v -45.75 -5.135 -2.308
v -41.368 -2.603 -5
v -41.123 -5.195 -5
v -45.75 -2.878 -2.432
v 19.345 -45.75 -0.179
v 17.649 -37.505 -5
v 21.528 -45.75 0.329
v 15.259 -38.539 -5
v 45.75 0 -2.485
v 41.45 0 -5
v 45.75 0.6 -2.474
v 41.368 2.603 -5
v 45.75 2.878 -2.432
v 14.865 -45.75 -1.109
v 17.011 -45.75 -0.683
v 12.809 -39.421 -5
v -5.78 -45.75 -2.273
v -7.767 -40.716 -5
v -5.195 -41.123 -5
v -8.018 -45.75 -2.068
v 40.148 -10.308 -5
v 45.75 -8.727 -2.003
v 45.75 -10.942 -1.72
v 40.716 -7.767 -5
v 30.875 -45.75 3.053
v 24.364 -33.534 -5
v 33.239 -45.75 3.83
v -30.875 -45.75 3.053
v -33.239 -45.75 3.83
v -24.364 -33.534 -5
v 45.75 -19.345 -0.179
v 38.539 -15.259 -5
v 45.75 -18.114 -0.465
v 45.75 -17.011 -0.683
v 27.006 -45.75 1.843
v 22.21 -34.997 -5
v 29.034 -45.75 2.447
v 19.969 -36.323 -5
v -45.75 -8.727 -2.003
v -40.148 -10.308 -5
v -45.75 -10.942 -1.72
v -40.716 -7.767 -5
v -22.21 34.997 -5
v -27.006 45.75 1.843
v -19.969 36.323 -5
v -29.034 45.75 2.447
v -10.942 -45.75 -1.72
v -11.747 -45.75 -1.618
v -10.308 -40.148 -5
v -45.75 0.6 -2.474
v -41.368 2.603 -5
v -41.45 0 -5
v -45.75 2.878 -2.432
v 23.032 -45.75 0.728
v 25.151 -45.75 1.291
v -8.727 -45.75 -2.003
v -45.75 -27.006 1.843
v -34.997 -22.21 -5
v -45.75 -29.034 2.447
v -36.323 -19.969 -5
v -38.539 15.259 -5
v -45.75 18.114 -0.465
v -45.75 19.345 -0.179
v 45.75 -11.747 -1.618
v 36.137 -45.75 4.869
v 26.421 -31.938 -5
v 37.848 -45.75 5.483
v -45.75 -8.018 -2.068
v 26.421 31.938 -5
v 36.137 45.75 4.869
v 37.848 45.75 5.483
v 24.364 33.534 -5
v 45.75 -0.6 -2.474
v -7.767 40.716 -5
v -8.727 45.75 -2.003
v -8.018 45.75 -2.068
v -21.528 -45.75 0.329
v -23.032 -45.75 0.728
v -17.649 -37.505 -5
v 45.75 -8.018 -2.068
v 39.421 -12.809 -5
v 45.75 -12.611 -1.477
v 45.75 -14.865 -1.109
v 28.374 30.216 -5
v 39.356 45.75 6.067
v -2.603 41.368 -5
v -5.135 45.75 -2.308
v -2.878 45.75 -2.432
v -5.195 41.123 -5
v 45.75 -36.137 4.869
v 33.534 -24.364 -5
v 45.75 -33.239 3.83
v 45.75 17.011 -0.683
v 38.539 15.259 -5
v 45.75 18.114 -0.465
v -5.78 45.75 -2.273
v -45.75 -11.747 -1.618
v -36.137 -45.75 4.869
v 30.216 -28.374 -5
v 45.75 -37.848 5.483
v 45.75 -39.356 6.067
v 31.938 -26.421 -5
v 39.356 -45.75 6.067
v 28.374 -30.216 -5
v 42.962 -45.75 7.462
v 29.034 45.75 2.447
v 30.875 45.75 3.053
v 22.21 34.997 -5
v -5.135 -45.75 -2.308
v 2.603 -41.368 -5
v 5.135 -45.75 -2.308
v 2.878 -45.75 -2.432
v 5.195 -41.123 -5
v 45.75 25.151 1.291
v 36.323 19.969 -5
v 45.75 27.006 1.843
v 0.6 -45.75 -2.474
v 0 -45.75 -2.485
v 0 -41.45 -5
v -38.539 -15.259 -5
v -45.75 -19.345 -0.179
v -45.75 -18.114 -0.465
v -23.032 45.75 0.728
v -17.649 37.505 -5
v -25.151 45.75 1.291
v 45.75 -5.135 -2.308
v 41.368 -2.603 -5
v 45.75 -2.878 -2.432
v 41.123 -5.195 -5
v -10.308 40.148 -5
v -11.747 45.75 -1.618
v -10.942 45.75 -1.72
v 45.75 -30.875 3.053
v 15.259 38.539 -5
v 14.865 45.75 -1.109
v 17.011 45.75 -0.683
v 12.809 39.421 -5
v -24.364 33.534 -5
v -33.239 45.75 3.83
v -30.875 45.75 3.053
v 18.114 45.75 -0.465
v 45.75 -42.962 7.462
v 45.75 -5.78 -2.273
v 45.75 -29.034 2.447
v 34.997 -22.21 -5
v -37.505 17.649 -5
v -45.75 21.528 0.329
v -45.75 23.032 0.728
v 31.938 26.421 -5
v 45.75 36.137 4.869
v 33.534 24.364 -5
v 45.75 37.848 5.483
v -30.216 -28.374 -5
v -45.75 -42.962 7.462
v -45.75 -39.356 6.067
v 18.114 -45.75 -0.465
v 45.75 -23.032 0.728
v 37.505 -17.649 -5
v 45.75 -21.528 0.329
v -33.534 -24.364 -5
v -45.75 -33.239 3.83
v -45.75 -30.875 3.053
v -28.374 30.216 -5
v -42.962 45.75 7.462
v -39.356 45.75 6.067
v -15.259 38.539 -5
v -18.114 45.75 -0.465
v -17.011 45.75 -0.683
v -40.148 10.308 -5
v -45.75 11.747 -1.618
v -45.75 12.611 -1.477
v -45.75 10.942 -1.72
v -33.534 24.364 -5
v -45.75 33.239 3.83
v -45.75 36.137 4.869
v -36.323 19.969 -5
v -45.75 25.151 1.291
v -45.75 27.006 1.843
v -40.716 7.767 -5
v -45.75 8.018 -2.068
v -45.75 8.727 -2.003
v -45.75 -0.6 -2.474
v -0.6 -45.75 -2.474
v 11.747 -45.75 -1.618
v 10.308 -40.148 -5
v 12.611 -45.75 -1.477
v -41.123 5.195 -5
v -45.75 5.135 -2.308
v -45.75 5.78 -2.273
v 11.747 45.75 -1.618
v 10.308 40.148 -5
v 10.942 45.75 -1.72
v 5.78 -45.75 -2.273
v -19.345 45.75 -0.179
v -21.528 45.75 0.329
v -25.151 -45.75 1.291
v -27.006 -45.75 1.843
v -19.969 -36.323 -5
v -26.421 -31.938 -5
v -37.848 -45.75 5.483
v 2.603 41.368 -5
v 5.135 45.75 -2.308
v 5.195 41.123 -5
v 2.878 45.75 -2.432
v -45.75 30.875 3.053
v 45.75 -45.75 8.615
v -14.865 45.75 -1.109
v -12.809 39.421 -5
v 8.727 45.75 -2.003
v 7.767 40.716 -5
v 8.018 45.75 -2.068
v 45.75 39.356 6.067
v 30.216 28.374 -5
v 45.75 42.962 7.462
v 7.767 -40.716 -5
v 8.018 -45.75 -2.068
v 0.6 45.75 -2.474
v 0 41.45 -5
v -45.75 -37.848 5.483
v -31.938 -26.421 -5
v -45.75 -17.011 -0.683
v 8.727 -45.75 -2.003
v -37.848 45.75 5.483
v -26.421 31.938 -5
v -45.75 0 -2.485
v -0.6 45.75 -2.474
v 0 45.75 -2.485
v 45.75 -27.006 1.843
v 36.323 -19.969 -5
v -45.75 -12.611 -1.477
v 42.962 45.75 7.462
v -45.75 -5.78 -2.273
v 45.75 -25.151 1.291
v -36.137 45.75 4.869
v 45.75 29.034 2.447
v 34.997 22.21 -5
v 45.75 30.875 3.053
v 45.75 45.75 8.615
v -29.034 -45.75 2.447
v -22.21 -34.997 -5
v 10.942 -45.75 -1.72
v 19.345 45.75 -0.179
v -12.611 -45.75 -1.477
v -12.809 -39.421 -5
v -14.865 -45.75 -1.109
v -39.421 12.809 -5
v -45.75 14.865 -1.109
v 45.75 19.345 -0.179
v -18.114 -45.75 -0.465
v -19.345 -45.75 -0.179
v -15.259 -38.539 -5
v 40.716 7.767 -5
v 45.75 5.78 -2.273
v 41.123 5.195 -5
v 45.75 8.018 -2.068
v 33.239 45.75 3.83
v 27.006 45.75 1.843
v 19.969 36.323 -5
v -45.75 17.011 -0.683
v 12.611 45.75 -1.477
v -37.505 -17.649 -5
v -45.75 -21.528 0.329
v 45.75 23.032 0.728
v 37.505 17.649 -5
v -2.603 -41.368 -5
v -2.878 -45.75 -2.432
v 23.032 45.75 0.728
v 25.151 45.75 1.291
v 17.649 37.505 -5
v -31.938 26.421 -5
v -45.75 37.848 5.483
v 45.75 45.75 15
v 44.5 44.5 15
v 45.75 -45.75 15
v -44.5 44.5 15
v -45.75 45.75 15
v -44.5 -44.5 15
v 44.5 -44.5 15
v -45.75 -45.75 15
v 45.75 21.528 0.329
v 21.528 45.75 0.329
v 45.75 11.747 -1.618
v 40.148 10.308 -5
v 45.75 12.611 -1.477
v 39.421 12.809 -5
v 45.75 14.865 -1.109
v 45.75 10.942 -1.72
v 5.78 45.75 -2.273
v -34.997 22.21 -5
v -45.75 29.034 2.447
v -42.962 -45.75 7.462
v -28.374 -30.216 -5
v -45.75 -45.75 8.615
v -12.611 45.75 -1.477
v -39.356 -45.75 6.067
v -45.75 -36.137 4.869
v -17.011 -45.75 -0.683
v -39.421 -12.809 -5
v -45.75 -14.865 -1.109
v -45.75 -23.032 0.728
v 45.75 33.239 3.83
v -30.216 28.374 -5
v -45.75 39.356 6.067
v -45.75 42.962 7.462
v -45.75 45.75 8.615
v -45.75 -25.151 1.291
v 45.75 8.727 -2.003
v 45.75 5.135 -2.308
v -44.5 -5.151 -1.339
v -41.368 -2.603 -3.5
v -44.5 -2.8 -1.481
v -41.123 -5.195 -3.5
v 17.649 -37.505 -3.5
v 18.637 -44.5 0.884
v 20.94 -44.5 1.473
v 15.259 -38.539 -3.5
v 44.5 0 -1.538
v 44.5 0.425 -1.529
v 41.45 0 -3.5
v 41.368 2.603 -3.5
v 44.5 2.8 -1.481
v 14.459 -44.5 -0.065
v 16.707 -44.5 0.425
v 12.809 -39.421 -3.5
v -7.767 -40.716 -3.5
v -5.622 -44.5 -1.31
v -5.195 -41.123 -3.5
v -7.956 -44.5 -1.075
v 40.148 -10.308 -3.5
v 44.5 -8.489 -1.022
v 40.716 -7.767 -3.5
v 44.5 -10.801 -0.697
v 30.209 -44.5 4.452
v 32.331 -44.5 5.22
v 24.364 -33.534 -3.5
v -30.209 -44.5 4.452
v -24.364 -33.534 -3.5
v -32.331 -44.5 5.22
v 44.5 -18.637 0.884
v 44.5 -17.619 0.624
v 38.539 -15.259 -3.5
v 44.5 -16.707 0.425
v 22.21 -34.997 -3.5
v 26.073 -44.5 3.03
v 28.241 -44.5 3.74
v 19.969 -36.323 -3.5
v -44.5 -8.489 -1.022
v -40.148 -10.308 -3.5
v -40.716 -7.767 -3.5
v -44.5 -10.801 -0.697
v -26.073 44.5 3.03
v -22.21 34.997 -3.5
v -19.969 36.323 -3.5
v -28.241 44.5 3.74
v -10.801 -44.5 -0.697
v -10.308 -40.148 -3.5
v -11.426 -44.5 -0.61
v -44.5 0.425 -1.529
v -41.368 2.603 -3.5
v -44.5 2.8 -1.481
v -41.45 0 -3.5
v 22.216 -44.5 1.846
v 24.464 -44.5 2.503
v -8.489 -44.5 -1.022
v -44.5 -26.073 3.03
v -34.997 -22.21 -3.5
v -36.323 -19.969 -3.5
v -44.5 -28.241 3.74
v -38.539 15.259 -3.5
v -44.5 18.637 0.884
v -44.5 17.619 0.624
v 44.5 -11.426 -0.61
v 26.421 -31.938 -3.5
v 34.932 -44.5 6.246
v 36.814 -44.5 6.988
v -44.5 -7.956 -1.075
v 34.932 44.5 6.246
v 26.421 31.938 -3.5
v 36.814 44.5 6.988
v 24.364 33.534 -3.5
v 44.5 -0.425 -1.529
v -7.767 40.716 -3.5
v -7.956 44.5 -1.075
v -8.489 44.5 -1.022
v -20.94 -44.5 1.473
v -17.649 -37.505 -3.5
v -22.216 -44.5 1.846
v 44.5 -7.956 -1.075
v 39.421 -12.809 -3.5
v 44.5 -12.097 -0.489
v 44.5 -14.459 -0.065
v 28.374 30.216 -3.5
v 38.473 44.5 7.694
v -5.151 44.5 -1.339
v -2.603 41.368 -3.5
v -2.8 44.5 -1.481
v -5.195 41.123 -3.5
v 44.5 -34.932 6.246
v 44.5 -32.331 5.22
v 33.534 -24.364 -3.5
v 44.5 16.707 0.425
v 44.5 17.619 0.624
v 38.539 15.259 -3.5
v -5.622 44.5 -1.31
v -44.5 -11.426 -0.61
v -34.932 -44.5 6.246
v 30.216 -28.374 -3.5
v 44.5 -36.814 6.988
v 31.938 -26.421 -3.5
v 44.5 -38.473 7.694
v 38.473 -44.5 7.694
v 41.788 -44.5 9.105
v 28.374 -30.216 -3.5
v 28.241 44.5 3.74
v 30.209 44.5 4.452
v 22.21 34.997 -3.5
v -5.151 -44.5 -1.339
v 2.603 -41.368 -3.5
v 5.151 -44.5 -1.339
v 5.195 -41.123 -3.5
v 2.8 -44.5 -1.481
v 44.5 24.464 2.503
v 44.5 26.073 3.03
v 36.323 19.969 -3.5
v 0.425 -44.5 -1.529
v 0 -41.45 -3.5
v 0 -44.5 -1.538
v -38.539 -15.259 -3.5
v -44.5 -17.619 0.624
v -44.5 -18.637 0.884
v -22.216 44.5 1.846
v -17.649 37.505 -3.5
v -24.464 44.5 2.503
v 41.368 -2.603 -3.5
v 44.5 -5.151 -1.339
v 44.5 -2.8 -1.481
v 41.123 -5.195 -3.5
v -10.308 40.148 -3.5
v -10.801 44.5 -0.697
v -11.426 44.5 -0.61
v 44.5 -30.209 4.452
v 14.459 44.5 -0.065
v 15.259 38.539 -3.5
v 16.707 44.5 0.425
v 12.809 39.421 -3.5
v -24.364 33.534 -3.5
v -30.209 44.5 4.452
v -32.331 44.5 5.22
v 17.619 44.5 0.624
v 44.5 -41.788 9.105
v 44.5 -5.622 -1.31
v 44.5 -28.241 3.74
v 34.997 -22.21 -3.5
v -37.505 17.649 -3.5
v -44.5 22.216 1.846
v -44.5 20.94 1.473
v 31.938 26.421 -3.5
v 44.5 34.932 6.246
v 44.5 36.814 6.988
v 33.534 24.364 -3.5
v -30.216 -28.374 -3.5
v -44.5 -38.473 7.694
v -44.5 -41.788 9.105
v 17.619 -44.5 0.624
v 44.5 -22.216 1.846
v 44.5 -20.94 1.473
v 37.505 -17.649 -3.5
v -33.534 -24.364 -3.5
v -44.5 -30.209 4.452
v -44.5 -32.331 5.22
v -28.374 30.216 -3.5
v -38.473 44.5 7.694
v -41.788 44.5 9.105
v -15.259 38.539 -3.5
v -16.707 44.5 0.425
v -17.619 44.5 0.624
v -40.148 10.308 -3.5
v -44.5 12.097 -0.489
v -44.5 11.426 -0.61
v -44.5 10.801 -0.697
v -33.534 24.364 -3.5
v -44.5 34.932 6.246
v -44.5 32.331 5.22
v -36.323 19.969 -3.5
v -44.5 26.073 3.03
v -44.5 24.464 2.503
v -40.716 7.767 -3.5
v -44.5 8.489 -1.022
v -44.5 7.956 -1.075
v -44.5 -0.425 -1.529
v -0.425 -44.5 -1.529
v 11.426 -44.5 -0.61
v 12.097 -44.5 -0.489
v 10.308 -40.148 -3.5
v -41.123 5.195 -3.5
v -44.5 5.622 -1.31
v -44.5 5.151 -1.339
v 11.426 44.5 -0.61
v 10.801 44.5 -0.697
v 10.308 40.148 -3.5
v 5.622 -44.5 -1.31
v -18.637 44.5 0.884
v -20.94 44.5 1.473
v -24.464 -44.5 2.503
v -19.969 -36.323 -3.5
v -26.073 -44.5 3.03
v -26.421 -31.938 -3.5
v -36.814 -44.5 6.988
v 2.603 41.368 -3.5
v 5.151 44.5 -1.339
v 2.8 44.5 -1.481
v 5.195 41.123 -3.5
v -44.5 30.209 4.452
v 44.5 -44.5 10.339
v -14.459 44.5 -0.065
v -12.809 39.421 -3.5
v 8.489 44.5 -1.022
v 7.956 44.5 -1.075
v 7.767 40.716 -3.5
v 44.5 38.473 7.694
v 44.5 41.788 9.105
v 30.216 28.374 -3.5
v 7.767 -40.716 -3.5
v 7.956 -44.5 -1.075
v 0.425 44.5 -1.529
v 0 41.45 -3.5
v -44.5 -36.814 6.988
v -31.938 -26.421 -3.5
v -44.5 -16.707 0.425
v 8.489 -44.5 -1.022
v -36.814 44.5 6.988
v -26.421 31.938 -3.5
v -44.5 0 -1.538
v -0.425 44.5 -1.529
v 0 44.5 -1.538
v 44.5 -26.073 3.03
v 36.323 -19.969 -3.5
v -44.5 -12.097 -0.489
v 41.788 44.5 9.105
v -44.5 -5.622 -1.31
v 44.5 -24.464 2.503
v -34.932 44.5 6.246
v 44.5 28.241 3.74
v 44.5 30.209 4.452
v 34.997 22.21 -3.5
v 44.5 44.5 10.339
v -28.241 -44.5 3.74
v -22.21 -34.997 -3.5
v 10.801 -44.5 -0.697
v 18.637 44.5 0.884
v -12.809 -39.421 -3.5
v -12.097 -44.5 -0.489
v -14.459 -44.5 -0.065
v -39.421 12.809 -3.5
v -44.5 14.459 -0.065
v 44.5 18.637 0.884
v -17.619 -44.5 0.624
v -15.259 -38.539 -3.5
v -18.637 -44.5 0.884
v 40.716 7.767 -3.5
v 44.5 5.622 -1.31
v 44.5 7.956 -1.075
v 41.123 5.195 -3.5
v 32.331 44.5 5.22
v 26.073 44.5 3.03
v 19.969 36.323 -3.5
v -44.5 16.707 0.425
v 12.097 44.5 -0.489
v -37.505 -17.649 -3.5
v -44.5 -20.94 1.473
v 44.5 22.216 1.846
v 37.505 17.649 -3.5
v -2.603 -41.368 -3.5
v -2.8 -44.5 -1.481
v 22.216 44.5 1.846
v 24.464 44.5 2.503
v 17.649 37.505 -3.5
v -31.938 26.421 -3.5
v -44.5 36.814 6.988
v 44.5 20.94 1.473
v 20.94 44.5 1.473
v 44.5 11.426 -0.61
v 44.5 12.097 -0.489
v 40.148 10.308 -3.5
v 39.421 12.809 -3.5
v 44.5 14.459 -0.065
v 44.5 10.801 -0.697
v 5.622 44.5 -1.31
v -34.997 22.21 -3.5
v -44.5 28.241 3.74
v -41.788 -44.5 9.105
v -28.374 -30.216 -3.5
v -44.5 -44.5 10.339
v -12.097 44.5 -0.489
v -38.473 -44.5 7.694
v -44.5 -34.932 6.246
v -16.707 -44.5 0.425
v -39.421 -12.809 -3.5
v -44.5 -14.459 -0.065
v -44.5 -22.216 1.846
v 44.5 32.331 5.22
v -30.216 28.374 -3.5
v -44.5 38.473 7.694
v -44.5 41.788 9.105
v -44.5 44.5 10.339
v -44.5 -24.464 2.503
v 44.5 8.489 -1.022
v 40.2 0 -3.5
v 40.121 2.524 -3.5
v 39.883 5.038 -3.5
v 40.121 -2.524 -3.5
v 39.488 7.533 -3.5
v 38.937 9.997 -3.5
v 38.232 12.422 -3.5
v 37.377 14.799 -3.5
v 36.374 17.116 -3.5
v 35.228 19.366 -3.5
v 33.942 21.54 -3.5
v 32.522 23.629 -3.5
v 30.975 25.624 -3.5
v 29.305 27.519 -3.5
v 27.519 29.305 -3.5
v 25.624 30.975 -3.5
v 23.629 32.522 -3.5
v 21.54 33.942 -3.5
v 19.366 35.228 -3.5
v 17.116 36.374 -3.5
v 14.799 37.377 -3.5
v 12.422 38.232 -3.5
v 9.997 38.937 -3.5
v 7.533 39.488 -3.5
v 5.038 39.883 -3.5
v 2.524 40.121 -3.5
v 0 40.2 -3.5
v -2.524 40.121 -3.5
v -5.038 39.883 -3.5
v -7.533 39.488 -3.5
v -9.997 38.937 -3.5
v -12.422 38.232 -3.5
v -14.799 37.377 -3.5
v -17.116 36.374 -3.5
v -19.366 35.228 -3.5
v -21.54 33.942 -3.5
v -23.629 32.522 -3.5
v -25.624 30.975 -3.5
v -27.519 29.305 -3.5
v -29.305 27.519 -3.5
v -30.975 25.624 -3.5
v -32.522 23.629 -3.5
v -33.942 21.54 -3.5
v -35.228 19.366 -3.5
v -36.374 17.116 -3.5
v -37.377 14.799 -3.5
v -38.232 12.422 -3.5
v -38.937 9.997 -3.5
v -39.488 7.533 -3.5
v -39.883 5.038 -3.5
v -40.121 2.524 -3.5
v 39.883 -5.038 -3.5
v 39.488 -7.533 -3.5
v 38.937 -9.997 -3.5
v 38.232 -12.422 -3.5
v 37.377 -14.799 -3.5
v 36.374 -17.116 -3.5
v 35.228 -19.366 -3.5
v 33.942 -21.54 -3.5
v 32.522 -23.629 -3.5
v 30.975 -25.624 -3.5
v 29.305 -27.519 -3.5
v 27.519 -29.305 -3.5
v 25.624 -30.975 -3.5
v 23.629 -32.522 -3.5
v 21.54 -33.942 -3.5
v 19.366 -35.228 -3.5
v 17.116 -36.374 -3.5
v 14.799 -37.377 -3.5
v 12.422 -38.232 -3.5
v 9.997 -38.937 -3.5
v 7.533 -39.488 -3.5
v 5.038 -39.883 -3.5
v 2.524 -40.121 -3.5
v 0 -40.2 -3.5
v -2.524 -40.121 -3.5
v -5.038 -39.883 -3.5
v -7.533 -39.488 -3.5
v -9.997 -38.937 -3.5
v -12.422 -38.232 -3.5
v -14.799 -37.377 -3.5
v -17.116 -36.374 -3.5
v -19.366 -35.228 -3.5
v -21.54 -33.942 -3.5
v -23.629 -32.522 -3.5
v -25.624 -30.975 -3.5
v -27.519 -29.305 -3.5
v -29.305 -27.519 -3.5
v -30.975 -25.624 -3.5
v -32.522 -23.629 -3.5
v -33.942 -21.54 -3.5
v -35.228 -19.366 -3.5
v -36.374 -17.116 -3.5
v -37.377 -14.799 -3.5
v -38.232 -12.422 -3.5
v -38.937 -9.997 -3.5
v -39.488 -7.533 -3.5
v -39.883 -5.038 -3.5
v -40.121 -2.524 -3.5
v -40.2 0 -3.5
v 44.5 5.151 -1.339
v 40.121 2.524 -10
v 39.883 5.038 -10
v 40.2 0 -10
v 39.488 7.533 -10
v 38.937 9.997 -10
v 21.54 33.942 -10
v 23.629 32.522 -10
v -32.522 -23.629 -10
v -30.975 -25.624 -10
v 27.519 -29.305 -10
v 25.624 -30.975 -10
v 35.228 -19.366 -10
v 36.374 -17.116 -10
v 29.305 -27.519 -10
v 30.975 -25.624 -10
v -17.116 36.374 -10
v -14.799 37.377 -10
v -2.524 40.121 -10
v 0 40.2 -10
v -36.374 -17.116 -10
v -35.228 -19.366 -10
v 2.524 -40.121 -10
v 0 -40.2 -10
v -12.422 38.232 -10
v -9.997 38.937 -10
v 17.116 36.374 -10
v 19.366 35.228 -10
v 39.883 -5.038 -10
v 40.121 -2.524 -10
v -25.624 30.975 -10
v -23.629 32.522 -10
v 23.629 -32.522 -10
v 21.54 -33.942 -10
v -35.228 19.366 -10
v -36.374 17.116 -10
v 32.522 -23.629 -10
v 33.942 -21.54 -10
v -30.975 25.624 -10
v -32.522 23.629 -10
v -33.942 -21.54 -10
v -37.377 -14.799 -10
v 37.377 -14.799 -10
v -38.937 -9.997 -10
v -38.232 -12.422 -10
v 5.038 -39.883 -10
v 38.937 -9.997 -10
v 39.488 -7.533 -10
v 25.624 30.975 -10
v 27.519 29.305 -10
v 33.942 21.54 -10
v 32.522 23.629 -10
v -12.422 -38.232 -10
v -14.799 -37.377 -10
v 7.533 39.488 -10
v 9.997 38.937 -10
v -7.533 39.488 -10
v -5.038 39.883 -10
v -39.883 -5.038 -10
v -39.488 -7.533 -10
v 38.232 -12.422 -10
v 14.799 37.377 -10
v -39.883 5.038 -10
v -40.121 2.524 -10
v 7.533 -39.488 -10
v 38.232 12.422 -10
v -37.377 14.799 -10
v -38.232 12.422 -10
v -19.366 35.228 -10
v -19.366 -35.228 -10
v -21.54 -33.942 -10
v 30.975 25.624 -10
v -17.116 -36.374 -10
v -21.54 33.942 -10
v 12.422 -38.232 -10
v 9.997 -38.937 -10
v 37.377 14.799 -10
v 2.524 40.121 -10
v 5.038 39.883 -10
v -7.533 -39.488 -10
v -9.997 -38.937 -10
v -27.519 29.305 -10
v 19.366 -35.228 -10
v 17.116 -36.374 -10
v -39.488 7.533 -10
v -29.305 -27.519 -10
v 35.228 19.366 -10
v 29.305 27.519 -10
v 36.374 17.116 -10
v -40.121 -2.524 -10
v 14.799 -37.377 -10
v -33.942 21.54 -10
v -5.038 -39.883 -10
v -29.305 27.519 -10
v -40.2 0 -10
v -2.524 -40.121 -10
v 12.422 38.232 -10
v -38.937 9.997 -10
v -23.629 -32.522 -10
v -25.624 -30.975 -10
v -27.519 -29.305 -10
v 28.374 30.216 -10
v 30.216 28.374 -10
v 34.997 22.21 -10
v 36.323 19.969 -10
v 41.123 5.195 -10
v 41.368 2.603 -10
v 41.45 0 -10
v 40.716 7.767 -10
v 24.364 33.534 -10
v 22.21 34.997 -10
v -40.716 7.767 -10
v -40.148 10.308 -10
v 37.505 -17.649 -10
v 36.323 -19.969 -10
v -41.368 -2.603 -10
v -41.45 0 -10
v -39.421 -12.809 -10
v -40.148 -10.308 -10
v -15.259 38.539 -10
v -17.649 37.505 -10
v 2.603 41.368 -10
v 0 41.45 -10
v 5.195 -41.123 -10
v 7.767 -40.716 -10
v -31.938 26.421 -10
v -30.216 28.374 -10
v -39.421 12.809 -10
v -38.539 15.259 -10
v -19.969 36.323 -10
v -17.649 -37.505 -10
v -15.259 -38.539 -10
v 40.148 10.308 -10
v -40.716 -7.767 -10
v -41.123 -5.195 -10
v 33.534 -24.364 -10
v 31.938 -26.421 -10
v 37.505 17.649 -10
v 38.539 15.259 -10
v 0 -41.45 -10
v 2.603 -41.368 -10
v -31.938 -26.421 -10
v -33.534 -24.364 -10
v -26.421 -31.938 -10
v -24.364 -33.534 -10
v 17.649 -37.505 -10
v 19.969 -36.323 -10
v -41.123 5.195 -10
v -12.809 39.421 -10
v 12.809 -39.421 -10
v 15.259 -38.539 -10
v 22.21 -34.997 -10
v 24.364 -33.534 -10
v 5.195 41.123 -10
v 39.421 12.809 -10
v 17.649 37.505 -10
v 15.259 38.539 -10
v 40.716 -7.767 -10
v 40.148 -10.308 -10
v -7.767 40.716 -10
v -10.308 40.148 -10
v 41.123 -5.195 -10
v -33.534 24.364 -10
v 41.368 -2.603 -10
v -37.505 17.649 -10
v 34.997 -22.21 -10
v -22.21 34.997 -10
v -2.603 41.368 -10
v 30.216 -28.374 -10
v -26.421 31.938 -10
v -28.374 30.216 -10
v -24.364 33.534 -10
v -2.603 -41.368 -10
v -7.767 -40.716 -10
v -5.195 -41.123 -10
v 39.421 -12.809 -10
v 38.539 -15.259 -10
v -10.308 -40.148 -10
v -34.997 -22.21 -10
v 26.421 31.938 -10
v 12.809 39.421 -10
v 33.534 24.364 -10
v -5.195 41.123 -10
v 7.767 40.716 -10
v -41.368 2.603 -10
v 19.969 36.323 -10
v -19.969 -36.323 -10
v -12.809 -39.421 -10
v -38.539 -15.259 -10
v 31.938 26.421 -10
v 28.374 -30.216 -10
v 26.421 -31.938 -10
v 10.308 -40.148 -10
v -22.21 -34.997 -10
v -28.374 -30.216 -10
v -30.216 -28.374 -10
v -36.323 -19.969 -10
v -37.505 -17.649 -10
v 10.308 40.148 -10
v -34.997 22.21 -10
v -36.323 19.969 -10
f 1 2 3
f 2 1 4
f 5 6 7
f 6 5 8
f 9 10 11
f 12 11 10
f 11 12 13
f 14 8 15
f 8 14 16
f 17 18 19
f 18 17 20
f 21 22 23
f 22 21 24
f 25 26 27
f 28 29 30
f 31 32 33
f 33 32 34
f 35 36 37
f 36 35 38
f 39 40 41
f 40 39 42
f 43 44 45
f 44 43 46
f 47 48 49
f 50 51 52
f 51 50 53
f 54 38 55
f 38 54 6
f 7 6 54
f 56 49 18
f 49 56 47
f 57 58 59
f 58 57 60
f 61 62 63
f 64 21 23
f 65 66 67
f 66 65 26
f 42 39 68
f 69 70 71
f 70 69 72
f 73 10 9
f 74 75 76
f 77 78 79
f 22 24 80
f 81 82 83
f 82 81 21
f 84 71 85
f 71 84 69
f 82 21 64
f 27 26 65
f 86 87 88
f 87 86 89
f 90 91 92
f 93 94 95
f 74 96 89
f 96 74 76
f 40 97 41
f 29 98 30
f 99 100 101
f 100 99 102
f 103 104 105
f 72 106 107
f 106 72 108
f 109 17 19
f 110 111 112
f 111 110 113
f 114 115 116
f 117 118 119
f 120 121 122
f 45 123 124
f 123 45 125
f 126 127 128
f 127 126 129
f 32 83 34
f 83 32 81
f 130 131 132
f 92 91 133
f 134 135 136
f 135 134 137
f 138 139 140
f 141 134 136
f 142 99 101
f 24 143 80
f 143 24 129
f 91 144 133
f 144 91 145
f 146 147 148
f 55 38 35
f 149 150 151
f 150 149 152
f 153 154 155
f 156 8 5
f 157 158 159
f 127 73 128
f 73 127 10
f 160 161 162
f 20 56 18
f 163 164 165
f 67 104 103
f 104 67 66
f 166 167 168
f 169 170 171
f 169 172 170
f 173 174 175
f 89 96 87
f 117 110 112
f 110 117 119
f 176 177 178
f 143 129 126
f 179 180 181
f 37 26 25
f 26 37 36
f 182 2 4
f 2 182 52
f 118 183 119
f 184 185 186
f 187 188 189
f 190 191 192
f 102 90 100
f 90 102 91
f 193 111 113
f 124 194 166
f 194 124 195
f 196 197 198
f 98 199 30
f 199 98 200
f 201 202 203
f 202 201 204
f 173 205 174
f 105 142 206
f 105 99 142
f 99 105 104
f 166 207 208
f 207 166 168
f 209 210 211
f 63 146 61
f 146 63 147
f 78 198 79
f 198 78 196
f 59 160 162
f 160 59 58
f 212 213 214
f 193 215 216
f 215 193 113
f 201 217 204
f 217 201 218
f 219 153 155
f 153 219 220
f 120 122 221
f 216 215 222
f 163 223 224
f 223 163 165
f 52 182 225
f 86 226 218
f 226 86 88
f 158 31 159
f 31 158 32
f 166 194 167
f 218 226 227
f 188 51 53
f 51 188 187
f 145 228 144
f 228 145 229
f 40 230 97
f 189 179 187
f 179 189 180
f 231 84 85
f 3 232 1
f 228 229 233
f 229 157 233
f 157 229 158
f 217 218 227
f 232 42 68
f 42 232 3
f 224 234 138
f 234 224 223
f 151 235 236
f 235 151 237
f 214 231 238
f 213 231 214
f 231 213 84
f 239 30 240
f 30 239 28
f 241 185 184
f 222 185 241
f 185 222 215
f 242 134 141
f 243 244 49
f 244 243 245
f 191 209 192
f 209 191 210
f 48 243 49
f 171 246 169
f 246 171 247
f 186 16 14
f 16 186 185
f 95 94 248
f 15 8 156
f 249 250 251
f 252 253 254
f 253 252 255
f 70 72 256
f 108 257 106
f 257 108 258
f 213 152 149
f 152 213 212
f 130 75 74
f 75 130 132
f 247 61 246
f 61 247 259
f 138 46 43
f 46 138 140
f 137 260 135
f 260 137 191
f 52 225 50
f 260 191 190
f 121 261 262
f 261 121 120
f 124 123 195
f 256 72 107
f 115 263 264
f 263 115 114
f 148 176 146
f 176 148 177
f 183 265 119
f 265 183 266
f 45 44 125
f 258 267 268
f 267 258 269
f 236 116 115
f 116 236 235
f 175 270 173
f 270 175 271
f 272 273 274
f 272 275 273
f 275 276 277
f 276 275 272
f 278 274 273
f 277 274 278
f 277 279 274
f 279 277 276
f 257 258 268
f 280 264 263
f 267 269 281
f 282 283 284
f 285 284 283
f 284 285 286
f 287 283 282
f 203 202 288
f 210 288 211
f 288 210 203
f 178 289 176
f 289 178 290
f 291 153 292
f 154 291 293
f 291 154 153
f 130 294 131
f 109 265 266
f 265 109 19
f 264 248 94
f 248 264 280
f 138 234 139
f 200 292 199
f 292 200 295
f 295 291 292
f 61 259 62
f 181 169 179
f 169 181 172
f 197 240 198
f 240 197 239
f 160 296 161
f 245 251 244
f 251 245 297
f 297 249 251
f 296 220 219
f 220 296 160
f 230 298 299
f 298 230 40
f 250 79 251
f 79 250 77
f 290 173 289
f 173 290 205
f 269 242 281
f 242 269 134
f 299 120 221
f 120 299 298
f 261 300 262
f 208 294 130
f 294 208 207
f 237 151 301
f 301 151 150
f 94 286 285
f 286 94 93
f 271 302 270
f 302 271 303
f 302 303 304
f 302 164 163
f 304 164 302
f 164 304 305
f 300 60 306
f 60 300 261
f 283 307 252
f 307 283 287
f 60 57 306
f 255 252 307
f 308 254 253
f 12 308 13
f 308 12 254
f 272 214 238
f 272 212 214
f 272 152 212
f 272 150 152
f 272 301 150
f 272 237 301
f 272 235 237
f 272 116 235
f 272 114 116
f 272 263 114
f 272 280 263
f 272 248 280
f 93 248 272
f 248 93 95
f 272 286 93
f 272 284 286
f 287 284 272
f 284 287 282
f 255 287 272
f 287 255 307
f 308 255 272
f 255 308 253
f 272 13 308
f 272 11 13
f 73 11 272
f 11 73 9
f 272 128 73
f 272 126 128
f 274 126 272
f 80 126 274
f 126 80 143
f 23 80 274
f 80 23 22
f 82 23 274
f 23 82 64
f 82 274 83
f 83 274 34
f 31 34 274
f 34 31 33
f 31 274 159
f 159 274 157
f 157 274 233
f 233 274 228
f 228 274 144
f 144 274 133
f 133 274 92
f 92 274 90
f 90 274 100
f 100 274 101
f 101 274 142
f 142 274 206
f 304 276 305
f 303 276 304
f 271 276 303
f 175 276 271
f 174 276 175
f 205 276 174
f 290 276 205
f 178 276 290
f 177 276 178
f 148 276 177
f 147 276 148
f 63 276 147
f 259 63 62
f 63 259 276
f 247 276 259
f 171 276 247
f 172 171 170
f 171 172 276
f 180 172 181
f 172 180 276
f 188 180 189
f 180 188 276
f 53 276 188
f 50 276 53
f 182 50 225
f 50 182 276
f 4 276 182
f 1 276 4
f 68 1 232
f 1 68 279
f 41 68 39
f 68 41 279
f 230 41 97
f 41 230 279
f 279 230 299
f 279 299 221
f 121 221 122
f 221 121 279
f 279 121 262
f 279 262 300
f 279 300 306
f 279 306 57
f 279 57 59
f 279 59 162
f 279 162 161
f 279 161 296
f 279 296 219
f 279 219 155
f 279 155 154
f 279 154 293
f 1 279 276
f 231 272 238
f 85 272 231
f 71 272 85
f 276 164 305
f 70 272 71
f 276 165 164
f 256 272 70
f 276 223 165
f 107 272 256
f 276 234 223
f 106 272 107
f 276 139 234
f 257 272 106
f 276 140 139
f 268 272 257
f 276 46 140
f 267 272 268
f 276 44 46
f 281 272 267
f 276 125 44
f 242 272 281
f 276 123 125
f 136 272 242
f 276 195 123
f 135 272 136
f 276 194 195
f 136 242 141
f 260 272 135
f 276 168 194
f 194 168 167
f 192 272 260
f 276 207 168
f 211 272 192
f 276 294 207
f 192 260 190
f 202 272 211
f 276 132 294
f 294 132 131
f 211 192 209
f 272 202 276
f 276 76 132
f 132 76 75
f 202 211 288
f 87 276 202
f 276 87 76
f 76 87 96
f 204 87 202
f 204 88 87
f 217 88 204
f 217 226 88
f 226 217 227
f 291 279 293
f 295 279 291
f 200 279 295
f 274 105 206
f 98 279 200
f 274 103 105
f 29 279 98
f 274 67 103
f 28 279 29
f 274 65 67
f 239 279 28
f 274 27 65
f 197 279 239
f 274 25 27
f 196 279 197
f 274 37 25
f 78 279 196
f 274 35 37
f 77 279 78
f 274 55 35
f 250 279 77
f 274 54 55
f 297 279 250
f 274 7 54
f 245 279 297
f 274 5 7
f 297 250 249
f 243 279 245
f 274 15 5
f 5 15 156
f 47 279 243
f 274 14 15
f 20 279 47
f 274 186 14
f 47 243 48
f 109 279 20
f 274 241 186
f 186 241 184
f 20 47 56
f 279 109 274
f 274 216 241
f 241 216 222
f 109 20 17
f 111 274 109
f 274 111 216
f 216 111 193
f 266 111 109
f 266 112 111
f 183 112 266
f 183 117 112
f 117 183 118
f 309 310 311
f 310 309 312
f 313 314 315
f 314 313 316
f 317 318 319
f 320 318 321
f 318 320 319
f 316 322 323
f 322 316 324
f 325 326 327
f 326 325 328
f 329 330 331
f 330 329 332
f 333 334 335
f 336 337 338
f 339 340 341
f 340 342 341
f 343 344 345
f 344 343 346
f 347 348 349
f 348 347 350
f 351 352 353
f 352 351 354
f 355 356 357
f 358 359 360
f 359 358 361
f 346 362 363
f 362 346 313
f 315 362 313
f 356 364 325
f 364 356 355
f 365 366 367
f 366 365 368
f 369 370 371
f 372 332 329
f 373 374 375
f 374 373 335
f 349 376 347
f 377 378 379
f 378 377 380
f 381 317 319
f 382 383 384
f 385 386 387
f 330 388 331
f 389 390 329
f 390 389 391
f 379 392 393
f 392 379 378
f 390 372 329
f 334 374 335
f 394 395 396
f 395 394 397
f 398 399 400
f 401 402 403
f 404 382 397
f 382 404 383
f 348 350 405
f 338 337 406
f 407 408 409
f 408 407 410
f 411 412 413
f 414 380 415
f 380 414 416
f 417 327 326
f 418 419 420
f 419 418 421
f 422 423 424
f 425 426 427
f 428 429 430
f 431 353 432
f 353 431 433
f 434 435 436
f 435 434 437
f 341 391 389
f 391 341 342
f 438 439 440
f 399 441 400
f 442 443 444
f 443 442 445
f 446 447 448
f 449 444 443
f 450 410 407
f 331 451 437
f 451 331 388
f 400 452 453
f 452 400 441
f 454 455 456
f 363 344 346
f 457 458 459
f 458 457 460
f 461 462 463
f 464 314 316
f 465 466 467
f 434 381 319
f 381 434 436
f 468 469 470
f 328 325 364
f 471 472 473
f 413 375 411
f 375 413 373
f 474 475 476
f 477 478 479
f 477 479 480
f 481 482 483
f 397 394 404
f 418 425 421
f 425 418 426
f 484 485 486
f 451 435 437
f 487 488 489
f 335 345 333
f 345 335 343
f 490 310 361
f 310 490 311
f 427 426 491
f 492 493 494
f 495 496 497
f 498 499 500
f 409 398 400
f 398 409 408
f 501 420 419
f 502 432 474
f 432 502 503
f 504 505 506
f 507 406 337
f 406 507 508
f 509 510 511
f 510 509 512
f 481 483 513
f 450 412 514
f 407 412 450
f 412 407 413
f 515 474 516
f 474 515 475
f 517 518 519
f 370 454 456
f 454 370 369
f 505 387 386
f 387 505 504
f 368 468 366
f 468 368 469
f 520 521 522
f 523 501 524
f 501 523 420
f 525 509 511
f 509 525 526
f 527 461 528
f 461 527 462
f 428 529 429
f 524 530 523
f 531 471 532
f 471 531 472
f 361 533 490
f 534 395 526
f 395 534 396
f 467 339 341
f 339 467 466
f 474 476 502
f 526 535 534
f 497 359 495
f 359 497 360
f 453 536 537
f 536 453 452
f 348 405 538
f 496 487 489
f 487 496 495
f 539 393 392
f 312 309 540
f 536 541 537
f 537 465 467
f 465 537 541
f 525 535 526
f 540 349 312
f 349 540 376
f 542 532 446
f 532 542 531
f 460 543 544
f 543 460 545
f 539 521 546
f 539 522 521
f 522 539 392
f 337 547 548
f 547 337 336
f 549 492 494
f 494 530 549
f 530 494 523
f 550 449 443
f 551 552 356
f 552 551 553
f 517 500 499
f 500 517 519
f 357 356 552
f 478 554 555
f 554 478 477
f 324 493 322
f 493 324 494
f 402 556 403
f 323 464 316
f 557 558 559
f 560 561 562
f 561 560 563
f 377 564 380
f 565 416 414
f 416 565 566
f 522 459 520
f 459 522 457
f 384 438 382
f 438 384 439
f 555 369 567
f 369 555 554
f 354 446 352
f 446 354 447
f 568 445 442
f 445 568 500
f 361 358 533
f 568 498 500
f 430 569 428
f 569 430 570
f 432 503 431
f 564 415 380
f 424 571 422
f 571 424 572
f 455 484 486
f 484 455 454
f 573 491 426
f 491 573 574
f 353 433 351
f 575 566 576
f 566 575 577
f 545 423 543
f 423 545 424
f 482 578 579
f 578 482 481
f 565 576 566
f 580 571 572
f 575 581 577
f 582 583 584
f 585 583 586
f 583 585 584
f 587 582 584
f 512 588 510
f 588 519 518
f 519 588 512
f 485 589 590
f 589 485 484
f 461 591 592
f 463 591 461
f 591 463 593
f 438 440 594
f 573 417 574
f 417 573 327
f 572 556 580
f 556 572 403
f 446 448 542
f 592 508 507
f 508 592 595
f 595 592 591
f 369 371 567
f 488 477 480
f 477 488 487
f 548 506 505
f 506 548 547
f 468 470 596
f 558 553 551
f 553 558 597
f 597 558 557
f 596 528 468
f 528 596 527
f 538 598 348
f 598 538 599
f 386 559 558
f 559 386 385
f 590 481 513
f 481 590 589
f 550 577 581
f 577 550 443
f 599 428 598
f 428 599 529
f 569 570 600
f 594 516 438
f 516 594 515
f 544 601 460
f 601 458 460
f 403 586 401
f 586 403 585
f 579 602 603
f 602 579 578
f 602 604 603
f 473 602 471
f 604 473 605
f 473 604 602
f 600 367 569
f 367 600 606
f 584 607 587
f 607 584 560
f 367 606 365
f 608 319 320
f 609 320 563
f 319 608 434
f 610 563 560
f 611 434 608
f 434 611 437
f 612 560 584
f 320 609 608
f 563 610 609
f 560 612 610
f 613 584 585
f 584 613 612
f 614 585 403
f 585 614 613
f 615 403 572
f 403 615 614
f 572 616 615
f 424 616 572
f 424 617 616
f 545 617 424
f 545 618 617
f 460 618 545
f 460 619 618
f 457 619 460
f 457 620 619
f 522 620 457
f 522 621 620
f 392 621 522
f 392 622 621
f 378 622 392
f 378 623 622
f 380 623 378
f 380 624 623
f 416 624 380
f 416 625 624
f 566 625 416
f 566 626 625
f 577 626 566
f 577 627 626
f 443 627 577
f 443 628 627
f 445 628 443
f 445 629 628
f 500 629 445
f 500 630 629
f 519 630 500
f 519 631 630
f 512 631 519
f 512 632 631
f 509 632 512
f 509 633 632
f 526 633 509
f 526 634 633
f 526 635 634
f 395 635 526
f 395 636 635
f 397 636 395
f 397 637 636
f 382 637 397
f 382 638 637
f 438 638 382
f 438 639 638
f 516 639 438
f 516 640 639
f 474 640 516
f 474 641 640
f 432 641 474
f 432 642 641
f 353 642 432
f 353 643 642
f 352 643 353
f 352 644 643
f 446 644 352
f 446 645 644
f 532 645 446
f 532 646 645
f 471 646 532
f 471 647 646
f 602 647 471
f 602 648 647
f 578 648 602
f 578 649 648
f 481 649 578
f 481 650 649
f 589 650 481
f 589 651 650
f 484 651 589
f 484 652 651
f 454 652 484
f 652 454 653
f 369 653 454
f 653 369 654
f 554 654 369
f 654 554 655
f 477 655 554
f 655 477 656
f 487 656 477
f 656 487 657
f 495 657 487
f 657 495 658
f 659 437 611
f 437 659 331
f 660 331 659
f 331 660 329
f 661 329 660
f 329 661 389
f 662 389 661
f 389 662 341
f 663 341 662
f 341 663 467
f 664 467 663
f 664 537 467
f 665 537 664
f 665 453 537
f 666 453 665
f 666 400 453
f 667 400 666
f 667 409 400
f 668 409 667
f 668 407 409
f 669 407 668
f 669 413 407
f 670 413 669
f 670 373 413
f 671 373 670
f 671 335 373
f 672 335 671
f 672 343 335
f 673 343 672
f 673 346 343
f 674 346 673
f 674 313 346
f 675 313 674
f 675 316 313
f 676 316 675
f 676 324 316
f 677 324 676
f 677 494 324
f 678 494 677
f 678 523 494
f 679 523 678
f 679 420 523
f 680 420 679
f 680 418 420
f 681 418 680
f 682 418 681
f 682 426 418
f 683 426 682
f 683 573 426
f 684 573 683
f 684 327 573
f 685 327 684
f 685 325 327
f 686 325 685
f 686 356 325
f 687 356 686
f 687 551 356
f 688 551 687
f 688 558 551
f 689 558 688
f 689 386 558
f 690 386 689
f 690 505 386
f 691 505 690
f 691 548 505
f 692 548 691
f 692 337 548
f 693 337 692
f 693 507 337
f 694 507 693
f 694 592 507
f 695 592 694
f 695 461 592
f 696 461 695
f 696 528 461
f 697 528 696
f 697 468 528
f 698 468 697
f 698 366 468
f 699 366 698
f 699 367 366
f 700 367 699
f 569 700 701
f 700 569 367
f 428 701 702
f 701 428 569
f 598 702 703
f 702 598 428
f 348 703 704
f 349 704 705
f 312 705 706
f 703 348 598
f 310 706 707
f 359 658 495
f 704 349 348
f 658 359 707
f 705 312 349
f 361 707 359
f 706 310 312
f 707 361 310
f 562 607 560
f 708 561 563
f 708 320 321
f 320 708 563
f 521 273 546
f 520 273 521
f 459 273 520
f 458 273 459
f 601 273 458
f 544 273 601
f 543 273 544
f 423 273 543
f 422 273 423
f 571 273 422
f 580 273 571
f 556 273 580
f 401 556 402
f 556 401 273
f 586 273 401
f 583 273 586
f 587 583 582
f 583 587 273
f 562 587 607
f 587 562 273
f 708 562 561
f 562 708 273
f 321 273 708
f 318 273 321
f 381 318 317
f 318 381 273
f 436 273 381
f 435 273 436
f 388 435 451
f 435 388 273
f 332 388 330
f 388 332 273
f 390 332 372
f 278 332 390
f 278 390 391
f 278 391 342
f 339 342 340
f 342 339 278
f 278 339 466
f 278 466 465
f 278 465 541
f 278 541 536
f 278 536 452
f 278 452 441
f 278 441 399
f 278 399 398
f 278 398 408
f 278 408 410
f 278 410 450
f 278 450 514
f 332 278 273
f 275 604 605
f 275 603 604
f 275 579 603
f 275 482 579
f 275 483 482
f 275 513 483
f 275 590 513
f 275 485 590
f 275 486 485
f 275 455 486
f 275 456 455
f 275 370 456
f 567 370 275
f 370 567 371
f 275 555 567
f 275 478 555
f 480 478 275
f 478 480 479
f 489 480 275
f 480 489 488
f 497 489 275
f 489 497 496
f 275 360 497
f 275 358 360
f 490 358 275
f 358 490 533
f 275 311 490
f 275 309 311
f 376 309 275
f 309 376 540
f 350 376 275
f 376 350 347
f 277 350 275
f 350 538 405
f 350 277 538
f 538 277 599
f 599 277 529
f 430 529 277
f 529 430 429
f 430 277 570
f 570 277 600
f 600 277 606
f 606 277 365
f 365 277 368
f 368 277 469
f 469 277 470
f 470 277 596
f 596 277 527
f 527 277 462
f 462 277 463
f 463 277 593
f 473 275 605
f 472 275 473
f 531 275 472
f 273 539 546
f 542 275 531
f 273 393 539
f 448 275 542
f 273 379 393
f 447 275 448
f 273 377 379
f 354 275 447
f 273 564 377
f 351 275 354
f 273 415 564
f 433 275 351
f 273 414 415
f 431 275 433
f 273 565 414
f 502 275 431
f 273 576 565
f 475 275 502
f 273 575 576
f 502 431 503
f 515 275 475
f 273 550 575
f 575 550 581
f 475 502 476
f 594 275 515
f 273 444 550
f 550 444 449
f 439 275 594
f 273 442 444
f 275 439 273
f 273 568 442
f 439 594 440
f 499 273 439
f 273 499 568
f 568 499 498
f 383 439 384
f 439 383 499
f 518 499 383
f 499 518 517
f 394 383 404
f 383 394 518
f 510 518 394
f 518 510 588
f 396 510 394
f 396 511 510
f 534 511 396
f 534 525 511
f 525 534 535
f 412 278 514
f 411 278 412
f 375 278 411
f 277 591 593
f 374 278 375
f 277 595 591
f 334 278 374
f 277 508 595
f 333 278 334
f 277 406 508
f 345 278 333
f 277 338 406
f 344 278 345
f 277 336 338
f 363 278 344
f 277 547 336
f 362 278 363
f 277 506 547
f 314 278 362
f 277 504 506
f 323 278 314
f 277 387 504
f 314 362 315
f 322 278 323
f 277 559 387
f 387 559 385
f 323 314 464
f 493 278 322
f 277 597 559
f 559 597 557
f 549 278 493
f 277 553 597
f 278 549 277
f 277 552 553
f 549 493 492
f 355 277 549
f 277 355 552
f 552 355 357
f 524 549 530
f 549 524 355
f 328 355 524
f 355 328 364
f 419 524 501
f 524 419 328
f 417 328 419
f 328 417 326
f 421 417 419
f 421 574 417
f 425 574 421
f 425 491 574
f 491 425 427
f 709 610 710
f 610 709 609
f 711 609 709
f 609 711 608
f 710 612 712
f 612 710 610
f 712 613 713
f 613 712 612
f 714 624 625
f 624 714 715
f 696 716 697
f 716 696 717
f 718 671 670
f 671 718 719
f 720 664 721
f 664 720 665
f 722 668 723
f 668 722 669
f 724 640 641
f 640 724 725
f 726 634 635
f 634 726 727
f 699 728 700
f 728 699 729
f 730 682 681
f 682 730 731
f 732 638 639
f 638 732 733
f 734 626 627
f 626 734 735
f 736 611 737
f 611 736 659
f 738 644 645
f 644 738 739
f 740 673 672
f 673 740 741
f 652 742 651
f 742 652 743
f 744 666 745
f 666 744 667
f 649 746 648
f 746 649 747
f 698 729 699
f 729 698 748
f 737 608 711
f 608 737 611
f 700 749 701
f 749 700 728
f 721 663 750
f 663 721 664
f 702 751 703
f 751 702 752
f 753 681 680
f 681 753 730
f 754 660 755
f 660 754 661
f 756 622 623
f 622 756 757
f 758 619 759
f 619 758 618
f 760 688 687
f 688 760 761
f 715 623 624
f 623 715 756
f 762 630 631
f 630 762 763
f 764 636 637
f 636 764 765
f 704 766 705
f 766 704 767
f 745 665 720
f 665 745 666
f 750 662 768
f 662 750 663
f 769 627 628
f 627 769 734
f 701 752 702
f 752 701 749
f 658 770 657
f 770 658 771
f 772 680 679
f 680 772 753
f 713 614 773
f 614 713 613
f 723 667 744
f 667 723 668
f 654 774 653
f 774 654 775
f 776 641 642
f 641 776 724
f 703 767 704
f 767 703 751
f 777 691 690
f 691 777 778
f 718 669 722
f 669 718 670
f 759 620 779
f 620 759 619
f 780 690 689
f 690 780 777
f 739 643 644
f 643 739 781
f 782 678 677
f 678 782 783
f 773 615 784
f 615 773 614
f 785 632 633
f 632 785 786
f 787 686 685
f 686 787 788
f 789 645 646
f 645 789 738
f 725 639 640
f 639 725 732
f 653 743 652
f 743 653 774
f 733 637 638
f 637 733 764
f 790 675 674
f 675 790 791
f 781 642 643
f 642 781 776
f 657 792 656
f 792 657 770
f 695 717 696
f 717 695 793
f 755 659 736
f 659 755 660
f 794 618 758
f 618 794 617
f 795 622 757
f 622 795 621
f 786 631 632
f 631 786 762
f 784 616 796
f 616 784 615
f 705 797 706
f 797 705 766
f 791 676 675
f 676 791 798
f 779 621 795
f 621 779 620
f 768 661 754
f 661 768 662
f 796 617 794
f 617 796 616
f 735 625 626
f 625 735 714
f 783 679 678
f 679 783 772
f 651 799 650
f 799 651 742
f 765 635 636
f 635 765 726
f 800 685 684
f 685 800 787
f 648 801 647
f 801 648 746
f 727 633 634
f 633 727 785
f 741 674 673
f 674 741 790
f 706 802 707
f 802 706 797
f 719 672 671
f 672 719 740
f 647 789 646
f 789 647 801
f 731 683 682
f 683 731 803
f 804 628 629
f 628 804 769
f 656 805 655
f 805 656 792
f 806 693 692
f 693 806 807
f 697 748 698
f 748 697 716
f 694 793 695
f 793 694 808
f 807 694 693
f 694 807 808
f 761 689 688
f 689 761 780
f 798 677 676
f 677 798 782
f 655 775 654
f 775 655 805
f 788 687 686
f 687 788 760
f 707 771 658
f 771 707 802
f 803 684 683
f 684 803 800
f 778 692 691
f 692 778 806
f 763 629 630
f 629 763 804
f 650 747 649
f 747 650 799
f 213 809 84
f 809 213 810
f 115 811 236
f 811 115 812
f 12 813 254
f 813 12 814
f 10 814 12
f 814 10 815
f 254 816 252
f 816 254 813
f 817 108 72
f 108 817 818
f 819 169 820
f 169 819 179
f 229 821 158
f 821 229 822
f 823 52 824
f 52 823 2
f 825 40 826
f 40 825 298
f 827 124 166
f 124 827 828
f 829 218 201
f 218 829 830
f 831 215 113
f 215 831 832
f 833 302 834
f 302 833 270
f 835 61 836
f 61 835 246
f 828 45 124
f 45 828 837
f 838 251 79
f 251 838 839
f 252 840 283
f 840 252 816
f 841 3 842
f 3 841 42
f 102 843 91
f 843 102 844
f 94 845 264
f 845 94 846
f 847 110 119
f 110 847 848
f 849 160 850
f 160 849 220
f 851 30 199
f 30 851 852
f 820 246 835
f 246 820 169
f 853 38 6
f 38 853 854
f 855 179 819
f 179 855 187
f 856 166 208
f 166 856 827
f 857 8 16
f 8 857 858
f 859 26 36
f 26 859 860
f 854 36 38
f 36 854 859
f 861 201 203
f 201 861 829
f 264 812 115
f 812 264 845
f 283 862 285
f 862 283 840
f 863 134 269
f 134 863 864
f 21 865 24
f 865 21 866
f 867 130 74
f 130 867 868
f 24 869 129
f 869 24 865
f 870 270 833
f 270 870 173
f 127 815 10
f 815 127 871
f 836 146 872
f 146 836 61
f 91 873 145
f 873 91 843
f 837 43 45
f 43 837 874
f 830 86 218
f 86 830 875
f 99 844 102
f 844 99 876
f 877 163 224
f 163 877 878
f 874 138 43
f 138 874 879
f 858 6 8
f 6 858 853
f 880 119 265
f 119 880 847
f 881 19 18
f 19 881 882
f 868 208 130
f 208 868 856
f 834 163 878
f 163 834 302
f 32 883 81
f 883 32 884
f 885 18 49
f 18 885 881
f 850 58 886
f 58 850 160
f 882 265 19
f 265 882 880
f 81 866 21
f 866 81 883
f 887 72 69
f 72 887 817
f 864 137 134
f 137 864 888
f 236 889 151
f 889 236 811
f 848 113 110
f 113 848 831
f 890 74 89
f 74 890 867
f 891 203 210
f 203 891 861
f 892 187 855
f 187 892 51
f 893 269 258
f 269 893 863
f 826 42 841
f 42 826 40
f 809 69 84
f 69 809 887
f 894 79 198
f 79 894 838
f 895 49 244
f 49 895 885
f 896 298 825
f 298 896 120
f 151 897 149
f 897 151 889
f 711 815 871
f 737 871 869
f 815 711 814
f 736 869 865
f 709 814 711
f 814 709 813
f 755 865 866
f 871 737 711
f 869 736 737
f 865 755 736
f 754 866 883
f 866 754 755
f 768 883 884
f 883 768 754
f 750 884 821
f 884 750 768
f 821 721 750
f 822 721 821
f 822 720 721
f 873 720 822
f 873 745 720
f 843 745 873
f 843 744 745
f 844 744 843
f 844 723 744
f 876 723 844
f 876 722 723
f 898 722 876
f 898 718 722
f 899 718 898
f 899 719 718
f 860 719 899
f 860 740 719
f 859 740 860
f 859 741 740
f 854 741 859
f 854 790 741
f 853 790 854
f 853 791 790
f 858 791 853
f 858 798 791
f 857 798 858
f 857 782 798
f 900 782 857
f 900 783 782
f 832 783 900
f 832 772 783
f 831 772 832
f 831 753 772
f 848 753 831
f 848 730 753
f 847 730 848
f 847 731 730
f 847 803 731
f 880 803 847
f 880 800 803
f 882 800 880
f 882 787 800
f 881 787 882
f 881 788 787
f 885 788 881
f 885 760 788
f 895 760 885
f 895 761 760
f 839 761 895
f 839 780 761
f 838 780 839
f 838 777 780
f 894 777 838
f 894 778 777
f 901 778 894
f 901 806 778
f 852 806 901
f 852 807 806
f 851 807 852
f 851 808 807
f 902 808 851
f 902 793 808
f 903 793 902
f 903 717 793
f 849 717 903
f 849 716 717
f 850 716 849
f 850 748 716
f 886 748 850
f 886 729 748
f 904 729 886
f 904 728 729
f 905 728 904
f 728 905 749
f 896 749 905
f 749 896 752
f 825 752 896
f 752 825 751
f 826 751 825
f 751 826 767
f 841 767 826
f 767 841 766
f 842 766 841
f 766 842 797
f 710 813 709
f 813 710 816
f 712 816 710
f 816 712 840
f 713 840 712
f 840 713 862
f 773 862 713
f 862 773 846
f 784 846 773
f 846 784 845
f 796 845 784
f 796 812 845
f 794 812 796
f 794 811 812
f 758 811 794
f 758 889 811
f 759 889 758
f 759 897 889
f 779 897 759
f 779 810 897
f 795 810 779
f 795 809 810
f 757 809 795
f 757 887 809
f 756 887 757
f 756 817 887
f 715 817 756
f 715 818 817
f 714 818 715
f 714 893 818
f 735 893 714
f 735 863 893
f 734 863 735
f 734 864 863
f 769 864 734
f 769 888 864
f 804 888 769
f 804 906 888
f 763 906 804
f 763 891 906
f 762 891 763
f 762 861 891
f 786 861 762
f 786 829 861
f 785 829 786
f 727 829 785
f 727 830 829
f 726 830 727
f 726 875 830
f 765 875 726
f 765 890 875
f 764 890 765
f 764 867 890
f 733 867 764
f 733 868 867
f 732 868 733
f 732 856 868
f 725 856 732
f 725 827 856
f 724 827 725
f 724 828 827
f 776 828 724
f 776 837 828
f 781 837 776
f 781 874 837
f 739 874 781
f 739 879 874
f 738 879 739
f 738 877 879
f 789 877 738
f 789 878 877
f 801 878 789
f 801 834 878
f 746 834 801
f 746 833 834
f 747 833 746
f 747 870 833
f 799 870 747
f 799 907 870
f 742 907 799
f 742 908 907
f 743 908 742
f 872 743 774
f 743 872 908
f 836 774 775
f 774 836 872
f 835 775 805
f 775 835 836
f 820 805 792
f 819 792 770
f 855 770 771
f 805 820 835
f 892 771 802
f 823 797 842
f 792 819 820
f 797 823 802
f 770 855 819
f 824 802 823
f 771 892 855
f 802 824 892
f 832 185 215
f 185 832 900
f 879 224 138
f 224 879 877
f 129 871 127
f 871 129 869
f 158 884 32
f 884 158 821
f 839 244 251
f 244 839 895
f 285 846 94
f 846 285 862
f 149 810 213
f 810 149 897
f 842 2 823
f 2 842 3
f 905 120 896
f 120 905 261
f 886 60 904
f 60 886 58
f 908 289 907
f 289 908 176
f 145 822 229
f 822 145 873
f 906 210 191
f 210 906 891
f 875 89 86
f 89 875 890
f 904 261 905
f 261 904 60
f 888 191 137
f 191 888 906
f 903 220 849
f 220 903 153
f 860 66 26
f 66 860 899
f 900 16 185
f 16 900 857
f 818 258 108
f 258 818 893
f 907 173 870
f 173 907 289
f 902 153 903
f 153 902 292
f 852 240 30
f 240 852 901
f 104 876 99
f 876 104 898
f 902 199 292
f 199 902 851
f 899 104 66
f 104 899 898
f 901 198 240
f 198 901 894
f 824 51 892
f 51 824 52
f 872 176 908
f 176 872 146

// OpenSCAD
// This is a primer tray funnel. It makes loading square primer boxes into round primer trays easier.
//
// Warning -- some sanding and fitting may be required.
//
// This is licensed under the creative commons+attribution license
//
// To fulfil the attribution requirement, please link to:
// http://www.thingiverse.com/thing:2190725

/* [Main] */

// Define number of facets (large numbers provide better smoothing)
$fn=100;

// Define height of lower ring and in mm
ring_height=5.0;

// Define outside diameter of lower cylinder in mm
outside_diameter=82.9;

// Define inside width of upper box in mm
inside_width=89.0;

// Define thickness of walls in mm
wall_thickness=2.5;

// Define height of cone in mm
cone_height=20.0;

module big_cone() // Draw shape of outer connecting cone
{
	intersection()
	{
		translate([0,0,0]) cylinder(h=cone_height,r1=outside_diameter/2,r2=inside_width*1.7/2,center=true);
		translate([0,0,0])	cube([inside_width+wall_thickness,inside_width+wall_thickness,cone_height+2],center=true);
	}
}

module little_cone() // Draw shape of inner connecting cone
{
	union()
	{
		intersection()
		{
			translate([0,0,0]) cylinder(h=cone_height+2,r1=outside_diameter/2,r2=inside_width*1.7/2,center=true);
			translate([0,0,0]) cube([inside_width,inside_width,cone_height+2],center=true);
		}
		translate([0,0,-cone_height/2-2]) cylinder(h=cone_height,r=(outside_diameter-wall_thickness)/2,center=true);
	}
}

module ring() // Draw shape of lower ring
{
	difference()
	{
		translate([0,0,0]) cylinder(h=ring_height,r=outside_diameter/2,center=true);
		translate([0,0,0]) cylinder(h=ring_height+6,r=(outside_diameter-wall_thickness)/2,center=true);
	}
}

union()
{
	difference()
	{
		translate([0,0,ring_height])                big_cone();
		translate([0,0,ring_height+wall_thickness]) little_cone();
	}
	translate([0,0,-cone_height/2+ring_height/2]) 	 ring();
}
